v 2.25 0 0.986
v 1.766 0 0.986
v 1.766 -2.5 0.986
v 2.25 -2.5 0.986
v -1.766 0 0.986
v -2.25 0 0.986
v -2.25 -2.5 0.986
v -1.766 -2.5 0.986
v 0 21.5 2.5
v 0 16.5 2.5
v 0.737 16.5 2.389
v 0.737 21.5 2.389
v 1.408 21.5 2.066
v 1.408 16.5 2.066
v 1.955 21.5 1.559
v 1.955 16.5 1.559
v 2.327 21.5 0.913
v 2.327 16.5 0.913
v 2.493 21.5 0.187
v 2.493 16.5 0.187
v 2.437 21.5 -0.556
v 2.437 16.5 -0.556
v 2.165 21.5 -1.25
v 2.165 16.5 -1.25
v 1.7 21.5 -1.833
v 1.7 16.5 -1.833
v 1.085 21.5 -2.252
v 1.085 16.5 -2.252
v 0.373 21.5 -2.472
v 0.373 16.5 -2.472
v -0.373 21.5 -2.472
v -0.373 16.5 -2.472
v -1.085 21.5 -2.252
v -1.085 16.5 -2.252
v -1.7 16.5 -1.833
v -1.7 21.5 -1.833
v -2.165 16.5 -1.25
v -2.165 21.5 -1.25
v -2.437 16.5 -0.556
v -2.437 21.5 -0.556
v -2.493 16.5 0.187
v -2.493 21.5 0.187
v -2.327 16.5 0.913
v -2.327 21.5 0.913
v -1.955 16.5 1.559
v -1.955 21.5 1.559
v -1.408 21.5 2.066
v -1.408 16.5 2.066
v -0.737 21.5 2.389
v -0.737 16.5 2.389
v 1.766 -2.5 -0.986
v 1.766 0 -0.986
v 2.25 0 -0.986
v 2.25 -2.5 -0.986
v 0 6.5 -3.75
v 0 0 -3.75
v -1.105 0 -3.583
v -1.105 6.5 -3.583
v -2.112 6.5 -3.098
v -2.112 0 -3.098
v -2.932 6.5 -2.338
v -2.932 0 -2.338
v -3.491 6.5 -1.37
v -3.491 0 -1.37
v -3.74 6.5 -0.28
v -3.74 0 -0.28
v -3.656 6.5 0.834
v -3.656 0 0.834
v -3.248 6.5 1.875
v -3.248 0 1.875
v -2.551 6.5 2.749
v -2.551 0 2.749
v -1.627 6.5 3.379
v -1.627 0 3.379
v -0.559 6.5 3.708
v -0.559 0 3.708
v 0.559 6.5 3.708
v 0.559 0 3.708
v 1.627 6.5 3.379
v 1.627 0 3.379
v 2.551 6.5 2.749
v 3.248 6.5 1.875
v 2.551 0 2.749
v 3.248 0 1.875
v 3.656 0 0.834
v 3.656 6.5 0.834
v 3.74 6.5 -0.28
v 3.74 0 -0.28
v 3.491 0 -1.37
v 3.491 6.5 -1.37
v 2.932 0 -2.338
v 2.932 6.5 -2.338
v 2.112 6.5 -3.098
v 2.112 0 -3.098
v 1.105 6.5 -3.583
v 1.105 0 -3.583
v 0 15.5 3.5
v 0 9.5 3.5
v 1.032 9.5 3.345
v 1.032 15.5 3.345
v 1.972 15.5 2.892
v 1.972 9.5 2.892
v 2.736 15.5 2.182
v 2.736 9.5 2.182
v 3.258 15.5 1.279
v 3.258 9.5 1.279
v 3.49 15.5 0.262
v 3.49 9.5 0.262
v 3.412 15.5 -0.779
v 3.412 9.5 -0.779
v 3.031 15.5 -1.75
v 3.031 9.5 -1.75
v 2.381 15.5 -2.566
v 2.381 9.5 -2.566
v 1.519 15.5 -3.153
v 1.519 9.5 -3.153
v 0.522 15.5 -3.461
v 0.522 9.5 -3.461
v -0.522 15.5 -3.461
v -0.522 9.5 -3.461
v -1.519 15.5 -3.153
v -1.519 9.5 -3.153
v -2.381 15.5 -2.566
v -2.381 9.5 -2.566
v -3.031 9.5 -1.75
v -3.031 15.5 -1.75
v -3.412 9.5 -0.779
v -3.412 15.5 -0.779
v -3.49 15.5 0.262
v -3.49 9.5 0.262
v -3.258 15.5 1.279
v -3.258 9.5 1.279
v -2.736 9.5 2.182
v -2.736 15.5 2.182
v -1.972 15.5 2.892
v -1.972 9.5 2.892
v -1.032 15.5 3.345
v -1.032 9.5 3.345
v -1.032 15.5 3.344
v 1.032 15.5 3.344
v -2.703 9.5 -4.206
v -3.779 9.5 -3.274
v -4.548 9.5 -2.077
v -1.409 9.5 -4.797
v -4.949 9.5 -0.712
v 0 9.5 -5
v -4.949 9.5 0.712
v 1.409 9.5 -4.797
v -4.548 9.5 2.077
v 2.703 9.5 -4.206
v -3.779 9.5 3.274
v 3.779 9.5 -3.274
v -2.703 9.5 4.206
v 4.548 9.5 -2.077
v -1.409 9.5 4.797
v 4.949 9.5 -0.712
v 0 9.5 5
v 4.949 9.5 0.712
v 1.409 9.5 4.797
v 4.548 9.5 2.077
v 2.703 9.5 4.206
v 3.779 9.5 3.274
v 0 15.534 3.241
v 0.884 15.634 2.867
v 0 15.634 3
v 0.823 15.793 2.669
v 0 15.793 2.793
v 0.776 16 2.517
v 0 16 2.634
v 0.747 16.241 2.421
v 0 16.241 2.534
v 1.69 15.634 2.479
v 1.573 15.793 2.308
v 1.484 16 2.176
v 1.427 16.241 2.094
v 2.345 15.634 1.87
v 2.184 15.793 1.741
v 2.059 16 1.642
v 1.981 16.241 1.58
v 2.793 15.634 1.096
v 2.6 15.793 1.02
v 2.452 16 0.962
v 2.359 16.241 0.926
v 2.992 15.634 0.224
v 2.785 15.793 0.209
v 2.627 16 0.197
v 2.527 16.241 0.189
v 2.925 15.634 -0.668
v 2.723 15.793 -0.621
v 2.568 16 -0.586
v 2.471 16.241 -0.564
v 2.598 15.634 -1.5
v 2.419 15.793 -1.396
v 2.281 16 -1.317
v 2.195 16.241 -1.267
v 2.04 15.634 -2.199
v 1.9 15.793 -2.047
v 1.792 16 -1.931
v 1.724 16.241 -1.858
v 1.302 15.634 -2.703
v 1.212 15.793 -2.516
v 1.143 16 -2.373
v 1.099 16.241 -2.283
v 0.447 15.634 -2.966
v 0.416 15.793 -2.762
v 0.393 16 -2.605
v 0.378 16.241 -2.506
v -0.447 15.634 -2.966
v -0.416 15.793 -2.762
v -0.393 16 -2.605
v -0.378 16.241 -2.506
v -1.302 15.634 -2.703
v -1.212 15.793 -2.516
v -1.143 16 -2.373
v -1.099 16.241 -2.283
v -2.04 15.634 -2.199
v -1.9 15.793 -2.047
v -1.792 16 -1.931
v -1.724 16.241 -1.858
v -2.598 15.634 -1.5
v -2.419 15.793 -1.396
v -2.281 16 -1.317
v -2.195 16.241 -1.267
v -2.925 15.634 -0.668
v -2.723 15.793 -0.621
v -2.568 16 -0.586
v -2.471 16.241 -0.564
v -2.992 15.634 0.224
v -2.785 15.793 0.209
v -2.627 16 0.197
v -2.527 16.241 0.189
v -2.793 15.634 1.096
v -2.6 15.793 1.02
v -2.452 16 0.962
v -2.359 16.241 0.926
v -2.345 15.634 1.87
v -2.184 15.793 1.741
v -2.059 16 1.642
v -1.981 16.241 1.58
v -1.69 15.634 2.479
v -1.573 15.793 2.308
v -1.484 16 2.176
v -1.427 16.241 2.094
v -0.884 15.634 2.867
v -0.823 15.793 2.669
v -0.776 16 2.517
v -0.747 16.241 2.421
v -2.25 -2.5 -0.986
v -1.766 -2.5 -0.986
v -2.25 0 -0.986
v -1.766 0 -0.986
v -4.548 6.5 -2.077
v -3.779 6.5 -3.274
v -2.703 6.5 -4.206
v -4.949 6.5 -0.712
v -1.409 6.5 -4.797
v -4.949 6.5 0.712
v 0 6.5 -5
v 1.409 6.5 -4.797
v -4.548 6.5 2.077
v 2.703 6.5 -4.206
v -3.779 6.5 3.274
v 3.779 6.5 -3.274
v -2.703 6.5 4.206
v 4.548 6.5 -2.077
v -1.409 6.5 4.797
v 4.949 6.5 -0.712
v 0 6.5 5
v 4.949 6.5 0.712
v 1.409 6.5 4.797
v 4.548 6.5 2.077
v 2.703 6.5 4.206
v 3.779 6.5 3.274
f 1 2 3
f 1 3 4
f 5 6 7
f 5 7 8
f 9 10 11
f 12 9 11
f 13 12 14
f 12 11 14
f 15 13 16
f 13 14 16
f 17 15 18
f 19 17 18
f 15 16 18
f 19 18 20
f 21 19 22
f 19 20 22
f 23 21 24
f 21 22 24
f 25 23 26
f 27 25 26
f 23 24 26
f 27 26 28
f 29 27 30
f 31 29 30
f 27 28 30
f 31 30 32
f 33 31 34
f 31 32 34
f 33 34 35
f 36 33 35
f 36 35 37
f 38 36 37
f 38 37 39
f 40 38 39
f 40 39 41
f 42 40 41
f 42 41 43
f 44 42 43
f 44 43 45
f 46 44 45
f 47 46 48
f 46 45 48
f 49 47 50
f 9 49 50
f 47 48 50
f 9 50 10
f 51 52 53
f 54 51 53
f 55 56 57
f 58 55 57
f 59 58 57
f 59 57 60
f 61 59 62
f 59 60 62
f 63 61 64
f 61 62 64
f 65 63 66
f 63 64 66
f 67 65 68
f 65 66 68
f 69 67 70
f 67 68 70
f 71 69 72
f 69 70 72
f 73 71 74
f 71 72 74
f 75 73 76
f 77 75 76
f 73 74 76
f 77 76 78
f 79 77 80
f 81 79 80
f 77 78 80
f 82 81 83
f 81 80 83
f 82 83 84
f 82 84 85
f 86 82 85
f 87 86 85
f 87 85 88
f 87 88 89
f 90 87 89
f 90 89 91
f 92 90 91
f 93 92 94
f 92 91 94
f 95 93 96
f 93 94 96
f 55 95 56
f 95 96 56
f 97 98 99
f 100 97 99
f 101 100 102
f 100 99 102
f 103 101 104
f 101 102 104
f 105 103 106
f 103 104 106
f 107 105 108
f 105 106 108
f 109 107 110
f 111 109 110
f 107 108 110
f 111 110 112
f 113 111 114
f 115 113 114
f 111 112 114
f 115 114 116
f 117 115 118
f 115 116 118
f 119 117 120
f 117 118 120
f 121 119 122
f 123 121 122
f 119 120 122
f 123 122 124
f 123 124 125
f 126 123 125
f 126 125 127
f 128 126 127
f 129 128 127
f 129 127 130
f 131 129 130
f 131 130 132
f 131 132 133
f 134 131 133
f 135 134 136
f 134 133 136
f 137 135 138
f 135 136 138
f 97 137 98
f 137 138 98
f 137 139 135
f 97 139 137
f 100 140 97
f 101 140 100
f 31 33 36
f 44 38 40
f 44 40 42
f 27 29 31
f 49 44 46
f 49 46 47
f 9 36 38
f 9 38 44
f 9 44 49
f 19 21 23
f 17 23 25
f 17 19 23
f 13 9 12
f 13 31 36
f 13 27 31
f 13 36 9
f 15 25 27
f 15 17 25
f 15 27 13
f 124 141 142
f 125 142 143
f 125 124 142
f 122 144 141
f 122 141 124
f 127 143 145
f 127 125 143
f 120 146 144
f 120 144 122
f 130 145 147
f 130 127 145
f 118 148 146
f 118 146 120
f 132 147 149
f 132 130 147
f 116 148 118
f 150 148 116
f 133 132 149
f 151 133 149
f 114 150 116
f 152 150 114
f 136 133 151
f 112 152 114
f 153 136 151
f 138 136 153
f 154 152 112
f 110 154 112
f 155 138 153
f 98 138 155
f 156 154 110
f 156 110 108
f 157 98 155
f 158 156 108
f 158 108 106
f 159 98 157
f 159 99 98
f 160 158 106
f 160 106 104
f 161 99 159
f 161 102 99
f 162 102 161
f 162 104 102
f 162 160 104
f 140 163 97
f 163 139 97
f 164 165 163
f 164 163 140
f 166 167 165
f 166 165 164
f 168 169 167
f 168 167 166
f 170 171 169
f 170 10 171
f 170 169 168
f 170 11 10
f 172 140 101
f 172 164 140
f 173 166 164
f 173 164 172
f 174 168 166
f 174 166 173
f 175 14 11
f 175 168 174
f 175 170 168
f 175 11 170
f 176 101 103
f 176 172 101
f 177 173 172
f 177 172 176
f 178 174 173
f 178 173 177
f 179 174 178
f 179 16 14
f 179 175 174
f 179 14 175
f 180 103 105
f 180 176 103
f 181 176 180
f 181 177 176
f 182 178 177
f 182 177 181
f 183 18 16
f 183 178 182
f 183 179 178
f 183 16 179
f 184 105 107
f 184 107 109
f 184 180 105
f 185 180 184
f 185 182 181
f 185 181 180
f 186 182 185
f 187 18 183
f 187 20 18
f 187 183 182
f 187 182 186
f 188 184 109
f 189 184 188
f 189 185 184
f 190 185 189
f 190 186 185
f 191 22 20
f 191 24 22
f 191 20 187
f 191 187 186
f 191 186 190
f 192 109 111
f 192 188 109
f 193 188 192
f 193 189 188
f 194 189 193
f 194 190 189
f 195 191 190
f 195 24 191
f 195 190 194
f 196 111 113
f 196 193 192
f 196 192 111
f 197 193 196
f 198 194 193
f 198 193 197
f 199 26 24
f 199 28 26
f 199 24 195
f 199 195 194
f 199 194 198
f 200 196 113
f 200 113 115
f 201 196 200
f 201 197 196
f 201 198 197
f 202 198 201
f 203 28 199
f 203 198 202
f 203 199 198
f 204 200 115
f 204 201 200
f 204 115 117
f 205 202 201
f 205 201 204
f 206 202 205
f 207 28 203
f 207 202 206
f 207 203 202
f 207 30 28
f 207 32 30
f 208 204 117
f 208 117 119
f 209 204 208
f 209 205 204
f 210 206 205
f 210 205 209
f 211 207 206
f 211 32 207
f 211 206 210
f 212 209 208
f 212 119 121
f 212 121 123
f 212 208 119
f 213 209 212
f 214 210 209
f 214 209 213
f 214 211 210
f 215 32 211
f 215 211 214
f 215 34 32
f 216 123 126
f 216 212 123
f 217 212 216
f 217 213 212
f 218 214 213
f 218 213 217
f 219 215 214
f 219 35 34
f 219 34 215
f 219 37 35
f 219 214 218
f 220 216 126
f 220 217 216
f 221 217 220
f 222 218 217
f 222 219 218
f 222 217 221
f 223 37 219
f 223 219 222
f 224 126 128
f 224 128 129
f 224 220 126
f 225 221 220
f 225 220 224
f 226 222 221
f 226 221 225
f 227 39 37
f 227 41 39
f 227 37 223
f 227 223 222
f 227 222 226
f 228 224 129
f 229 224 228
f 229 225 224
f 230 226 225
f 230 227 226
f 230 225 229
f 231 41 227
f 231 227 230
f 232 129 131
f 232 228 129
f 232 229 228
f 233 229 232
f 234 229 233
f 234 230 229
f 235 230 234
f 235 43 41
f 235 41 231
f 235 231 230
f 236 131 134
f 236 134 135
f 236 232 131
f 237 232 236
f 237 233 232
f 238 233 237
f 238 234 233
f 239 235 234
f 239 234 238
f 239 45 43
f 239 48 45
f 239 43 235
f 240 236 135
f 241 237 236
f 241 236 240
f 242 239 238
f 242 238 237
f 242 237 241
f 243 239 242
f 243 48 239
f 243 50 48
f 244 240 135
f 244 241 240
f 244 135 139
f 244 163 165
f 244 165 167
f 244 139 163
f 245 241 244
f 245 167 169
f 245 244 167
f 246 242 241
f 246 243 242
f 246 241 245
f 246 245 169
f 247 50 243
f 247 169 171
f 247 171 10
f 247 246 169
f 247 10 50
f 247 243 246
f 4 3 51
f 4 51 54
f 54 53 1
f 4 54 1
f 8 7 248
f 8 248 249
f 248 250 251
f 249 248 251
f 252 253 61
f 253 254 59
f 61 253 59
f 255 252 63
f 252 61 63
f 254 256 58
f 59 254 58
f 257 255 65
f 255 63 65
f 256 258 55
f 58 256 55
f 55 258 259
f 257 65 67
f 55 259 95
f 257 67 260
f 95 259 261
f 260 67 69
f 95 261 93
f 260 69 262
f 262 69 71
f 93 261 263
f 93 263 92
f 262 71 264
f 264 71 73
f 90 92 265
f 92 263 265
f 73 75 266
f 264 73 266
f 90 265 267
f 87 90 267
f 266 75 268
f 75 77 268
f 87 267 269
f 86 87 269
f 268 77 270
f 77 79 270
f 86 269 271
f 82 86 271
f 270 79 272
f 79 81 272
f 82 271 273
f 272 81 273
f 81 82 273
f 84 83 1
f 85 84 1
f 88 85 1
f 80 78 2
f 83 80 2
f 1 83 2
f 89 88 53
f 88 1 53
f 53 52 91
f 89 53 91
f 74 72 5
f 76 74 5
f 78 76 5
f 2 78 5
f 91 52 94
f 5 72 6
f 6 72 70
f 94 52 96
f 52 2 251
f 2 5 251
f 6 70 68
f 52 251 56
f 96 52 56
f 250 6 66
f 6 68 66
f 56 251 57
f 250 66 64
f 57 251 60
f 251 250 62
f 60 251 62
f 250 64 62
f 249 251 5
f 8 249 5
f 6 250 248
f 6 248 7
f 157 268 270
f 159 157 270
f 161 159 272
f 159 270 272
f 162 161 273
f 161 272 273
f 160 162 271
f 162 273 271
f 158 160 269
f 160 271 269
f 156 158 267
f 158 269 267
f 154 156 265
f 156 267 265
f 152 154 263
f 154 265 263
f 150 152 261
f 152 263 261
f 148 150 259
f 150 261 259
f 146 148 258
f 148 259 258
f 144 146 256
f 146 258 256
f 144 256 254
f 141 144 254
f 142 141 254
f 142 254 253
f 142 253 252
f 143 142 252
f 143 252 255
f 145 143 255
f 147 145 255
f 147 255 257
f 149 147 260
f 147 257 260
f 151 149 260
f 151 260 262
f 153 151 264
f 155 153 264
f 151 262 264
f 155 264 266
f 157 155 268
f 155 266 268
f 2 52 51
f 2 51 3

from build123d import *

# Parameters (mm, degrees)
SKETCH_1_R      = 3.75
EXTRUDE_1_DEPTH = 6.5
SKETCH_2_R      = 5
EXTRUDE_2_DEPTH = 3
SKETCH_3_R      = 3.5
EXTRUDE_3_DEPTH = 6
SKETCH_4_R      = 2.5
EXTRUDE_4_DEPTH = 6
FILLET_1_R      = 1
SKETCH_5_W      = 0.48356718
SKETCH_5_H      = 1.971466194
EXTRUDE_5_DEPTH = 2.5


with BuildPart() as part:
    # Эскиз1 → Бобышка-Вытянуть1 (new body)
    with BuildSketch(Plane(origin=(0, 0, 0), x_dir=(1, 0, 0), z_dir=(0, 1, 0))):
        with Locations(Location((0, 0, 0), (0, 0, 90))):
            Circle(SKETCH_1_R)
    extrude(amount=EXTRUDE_1_DEPTH)

    # Эскиз2 → Бобышка-Вытянуть2 (add)
    with BuildSketch(Plane(origin=(0, 6.5, 0), x_dir=(1, 0, 0), z_dir=(0, 1, 0))):
        with Locations(Location((0, 0, 0), (0, 0, 270))):
            Circle(SKETCH_2_R)
    extrude(amount=EXTRUDE_2_DEPTH)

    # Эскиз3 → Бобышка-Вытянуть3 (add)
    with BuildSketch(Plane(origin=(0, 9.5, 0), x_dir=(1, 0, 0), z_dir=(0, 1, 0))):
        with Locations(Location((0, 0, 0), (0, 0, 270))):
            Circle(SKETCH_3_R)
    extrude(amount=EXTRUDE_3_DEPTH)

    # Эскиз4 → Бобышка-Вытянуть4 (add)
    with BuildSketch(Plane(origin=(0, 15.5, 0), x_dir=(1, 0, 0), z_dir=(0, 1, 0))):
        with Locations(Location((0, 0, 0), (0, 0, 270))):
            Circle(SKETCH_4_R)
    extrude(amount=EXTRUDE_4_DEPTH)

    # Скругление1
    fillet_1_edges = [part.edges().sort_by_distance(p)[0] for p in [
        (0, 15.5, -2.5),
    ]]
    fillet(fillet_1_edges, radius=FILLET_1_R - 0.0001)  # a hair under: the kernel refuses the full size

    # Эскиз5 → Бобышка-Вытянуть5 (add)
    with BuildSketch(Plane.XZ):
        with Locations((2.00821641, 0)):
            Rectangle(SKETCH_5_W, SKETCH_5_H)
        with Locations((-2.00821641, 0)):
            Rectangle(SKETCH_5_W, SKETCH_5_H)
    extrude(amount=EXTRUDE_5_DEPTH)


solid = part.part
